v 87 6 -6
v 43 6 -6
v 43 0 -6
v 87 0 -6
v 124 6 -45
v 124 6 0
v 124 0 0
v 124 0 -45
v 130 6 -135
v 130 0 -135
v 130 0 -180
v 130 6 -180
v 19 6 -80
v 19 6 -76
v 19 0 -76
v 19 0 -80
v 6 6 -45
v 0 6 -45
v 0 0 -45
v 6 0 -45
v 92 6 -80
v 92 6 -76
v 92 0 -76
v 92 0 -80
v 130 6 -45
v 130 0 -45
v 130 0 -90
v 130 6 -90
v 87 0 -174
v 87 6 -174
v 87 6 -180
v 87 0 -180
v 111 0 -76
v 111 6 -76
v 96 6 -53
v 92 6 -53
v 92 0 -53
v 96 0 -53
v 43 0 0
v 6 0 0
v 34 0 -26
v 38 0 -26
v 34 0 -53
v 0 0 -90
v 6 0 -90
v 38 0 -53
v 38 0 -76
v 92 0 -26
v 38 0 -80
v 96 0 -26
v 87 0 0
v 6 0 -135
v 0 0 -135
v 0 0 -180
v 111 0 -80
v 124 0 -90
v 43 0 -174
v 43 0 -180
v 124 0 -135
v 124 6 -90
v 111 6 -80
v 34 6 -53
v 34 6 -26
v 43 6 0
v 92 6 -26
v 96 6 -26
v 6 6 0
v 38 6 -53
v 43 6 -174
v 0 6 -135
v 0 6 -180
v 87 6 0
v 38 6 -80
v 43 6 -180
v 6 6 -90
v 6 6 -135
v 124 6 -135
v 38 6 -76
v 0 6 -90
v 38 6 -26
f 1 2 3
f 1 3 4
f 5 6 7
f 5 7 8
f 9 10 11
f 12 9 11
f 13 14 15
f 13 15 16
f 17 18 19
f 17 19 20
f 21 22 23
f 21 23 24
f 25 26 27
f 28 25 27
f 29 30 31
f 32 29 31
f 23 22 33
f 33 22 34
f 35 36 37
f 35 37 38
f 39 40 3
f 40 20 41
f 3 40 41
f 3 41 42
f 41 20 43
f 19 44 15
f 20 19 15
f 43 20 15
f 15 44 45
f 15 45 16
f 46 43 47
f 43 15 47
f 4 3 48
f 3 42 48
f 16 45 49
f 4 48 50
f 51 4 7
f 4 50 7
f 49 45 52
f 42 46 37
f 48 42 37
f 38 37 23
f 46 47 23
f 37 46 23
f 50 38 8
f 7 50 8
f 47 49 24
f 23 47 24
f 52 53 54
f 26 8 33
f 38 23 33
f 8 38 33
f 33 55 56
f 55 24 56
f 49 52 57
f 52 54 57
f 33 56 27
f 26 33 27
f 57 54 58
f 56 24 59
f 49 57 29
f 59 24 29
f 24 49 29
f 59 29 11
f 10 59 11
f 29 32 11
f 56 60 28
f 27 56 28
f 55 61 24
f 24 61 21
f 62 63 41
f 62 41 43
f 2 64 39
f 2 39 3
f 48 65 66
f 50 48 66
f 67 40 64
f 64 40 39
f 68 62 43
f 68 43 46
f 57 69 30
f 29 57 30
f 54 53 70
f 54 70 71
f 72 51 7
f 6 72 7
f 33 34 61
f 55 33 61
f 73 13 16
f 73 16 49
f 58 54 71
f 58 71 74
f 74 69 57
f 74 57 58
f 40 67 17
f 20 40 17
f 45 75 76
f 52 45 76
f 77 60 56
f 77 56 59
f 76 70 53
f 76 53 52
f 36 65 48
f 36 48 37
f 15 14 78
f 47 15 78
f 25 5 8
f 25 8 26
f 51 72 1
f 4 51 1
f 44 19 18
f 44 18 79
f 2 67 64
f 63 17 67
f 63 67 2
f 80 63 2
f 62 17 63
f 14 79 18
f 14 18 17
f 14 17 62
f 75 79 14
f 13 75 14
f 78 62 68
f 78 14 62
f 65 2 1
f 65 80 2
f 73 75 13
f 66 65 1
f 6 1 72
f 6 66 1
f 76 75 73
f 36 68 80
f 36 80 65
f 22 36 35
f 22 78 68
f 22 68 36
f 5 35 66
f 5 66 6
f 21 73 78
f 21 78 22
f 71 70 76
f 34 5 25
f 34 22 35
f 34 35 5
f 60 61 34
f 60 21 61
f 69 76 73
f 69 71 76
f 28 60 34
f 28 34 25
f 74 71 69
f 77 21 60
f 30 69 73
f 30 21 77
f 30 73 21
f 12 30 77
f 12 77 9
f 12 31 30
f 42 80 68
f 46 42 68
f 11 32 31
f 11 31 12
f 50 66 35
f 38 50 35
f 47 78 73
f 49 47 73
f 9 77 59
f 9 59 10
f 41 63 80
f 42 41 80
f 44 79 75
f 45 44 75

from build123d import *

# Parameters (mm, degrees)
SKETCH1_W           = 130
SKETCH1_H           = 180
BOSS_EXTRUDE1_DEPTH = 6
SKETCH2_W           = 6
SKETCH2_H           = 45
SKETCH2_H_2         = 39
SKETCH2_H_3         = 6
SKETCH2_W_2         = 44
SKETCH2_W_3         = 15
SKETCH2_H_4         = 4
SKETCH2_W_4         = 4
SKETCH2_W_5         = 19
SKETCH2_H_5         = 27
CUT_EXTRUDE1_DEPTH  = 223.117086241


with BuildPart() as part:
    # Sketch1 → Boss-Extrude1 (new body)
    with BuildSketch(Plane(origin=(0, 0, 0), x_dir=(1, 0, 0), z_dir=(0, 1, 0))):
        with Locations((65, 90)):
            Rectangle(SKETCH1_W, SKETCH1_H)
    extrude(amount=BOSS_EXTRUDE1_DEPTH)

    # Sketch2 → Cut-Extrude1 (cut, through all)
    with BuildSketch(Plane(origin=(0, 6, 0), x_dir=(1, 0, 0), z_dir=(0, 1, 0))):
        with Locations((3, 112.5)):
            Rectangle(SKETCH2_W, SKETCH2_H)
        with Locations((3, 25.5)):
            Rectangle(SKETCH2_W, SKETCH2_H_2)
        with Locations((3, 3)):
            Rectangle(SKETCH2_W, SKETCH2_H_3)
        with Locations((127, 22.5)):
            Rectangle(SKETCH2_W, SKETCH2_H)
        with Locations((65, 3)):
            Rectangle(SKETCH2_W_2, SKETCH2_H_3)
        with Locations((127, 112.5)):
            Rectangle(SKETCH2_W, SKETCH2_H)
        with Locations((103.5, 78)):
            Rectangle(SKETCH2_W_3, SKETCH2_H_4)
        with Locations((94, 78)):
            Rectangle(SKETCH2_W_4, SKETCH2_H_4)
        with Locations((28.5, 78)):
            Rectangle(SKETCH2_W_5, SKETCH2_H_4)
        with Locations((36, 39.5)):
            Rectangle(SKETCH2_W_4, SKETCH2_H_5)
        with Locations((94, 39.5)):
            Rectangle(SKETCH2_W_4, SKETCH2_H_5)
        with Locations((65, 177)):
            Rectangle(SKETCH2_W_2, SKETCH2_H_3)
    extrude(amount=-CUT_EXTRUDE1_DEPTH, mode=Mode.SUBTRACT)


solid = part.part
